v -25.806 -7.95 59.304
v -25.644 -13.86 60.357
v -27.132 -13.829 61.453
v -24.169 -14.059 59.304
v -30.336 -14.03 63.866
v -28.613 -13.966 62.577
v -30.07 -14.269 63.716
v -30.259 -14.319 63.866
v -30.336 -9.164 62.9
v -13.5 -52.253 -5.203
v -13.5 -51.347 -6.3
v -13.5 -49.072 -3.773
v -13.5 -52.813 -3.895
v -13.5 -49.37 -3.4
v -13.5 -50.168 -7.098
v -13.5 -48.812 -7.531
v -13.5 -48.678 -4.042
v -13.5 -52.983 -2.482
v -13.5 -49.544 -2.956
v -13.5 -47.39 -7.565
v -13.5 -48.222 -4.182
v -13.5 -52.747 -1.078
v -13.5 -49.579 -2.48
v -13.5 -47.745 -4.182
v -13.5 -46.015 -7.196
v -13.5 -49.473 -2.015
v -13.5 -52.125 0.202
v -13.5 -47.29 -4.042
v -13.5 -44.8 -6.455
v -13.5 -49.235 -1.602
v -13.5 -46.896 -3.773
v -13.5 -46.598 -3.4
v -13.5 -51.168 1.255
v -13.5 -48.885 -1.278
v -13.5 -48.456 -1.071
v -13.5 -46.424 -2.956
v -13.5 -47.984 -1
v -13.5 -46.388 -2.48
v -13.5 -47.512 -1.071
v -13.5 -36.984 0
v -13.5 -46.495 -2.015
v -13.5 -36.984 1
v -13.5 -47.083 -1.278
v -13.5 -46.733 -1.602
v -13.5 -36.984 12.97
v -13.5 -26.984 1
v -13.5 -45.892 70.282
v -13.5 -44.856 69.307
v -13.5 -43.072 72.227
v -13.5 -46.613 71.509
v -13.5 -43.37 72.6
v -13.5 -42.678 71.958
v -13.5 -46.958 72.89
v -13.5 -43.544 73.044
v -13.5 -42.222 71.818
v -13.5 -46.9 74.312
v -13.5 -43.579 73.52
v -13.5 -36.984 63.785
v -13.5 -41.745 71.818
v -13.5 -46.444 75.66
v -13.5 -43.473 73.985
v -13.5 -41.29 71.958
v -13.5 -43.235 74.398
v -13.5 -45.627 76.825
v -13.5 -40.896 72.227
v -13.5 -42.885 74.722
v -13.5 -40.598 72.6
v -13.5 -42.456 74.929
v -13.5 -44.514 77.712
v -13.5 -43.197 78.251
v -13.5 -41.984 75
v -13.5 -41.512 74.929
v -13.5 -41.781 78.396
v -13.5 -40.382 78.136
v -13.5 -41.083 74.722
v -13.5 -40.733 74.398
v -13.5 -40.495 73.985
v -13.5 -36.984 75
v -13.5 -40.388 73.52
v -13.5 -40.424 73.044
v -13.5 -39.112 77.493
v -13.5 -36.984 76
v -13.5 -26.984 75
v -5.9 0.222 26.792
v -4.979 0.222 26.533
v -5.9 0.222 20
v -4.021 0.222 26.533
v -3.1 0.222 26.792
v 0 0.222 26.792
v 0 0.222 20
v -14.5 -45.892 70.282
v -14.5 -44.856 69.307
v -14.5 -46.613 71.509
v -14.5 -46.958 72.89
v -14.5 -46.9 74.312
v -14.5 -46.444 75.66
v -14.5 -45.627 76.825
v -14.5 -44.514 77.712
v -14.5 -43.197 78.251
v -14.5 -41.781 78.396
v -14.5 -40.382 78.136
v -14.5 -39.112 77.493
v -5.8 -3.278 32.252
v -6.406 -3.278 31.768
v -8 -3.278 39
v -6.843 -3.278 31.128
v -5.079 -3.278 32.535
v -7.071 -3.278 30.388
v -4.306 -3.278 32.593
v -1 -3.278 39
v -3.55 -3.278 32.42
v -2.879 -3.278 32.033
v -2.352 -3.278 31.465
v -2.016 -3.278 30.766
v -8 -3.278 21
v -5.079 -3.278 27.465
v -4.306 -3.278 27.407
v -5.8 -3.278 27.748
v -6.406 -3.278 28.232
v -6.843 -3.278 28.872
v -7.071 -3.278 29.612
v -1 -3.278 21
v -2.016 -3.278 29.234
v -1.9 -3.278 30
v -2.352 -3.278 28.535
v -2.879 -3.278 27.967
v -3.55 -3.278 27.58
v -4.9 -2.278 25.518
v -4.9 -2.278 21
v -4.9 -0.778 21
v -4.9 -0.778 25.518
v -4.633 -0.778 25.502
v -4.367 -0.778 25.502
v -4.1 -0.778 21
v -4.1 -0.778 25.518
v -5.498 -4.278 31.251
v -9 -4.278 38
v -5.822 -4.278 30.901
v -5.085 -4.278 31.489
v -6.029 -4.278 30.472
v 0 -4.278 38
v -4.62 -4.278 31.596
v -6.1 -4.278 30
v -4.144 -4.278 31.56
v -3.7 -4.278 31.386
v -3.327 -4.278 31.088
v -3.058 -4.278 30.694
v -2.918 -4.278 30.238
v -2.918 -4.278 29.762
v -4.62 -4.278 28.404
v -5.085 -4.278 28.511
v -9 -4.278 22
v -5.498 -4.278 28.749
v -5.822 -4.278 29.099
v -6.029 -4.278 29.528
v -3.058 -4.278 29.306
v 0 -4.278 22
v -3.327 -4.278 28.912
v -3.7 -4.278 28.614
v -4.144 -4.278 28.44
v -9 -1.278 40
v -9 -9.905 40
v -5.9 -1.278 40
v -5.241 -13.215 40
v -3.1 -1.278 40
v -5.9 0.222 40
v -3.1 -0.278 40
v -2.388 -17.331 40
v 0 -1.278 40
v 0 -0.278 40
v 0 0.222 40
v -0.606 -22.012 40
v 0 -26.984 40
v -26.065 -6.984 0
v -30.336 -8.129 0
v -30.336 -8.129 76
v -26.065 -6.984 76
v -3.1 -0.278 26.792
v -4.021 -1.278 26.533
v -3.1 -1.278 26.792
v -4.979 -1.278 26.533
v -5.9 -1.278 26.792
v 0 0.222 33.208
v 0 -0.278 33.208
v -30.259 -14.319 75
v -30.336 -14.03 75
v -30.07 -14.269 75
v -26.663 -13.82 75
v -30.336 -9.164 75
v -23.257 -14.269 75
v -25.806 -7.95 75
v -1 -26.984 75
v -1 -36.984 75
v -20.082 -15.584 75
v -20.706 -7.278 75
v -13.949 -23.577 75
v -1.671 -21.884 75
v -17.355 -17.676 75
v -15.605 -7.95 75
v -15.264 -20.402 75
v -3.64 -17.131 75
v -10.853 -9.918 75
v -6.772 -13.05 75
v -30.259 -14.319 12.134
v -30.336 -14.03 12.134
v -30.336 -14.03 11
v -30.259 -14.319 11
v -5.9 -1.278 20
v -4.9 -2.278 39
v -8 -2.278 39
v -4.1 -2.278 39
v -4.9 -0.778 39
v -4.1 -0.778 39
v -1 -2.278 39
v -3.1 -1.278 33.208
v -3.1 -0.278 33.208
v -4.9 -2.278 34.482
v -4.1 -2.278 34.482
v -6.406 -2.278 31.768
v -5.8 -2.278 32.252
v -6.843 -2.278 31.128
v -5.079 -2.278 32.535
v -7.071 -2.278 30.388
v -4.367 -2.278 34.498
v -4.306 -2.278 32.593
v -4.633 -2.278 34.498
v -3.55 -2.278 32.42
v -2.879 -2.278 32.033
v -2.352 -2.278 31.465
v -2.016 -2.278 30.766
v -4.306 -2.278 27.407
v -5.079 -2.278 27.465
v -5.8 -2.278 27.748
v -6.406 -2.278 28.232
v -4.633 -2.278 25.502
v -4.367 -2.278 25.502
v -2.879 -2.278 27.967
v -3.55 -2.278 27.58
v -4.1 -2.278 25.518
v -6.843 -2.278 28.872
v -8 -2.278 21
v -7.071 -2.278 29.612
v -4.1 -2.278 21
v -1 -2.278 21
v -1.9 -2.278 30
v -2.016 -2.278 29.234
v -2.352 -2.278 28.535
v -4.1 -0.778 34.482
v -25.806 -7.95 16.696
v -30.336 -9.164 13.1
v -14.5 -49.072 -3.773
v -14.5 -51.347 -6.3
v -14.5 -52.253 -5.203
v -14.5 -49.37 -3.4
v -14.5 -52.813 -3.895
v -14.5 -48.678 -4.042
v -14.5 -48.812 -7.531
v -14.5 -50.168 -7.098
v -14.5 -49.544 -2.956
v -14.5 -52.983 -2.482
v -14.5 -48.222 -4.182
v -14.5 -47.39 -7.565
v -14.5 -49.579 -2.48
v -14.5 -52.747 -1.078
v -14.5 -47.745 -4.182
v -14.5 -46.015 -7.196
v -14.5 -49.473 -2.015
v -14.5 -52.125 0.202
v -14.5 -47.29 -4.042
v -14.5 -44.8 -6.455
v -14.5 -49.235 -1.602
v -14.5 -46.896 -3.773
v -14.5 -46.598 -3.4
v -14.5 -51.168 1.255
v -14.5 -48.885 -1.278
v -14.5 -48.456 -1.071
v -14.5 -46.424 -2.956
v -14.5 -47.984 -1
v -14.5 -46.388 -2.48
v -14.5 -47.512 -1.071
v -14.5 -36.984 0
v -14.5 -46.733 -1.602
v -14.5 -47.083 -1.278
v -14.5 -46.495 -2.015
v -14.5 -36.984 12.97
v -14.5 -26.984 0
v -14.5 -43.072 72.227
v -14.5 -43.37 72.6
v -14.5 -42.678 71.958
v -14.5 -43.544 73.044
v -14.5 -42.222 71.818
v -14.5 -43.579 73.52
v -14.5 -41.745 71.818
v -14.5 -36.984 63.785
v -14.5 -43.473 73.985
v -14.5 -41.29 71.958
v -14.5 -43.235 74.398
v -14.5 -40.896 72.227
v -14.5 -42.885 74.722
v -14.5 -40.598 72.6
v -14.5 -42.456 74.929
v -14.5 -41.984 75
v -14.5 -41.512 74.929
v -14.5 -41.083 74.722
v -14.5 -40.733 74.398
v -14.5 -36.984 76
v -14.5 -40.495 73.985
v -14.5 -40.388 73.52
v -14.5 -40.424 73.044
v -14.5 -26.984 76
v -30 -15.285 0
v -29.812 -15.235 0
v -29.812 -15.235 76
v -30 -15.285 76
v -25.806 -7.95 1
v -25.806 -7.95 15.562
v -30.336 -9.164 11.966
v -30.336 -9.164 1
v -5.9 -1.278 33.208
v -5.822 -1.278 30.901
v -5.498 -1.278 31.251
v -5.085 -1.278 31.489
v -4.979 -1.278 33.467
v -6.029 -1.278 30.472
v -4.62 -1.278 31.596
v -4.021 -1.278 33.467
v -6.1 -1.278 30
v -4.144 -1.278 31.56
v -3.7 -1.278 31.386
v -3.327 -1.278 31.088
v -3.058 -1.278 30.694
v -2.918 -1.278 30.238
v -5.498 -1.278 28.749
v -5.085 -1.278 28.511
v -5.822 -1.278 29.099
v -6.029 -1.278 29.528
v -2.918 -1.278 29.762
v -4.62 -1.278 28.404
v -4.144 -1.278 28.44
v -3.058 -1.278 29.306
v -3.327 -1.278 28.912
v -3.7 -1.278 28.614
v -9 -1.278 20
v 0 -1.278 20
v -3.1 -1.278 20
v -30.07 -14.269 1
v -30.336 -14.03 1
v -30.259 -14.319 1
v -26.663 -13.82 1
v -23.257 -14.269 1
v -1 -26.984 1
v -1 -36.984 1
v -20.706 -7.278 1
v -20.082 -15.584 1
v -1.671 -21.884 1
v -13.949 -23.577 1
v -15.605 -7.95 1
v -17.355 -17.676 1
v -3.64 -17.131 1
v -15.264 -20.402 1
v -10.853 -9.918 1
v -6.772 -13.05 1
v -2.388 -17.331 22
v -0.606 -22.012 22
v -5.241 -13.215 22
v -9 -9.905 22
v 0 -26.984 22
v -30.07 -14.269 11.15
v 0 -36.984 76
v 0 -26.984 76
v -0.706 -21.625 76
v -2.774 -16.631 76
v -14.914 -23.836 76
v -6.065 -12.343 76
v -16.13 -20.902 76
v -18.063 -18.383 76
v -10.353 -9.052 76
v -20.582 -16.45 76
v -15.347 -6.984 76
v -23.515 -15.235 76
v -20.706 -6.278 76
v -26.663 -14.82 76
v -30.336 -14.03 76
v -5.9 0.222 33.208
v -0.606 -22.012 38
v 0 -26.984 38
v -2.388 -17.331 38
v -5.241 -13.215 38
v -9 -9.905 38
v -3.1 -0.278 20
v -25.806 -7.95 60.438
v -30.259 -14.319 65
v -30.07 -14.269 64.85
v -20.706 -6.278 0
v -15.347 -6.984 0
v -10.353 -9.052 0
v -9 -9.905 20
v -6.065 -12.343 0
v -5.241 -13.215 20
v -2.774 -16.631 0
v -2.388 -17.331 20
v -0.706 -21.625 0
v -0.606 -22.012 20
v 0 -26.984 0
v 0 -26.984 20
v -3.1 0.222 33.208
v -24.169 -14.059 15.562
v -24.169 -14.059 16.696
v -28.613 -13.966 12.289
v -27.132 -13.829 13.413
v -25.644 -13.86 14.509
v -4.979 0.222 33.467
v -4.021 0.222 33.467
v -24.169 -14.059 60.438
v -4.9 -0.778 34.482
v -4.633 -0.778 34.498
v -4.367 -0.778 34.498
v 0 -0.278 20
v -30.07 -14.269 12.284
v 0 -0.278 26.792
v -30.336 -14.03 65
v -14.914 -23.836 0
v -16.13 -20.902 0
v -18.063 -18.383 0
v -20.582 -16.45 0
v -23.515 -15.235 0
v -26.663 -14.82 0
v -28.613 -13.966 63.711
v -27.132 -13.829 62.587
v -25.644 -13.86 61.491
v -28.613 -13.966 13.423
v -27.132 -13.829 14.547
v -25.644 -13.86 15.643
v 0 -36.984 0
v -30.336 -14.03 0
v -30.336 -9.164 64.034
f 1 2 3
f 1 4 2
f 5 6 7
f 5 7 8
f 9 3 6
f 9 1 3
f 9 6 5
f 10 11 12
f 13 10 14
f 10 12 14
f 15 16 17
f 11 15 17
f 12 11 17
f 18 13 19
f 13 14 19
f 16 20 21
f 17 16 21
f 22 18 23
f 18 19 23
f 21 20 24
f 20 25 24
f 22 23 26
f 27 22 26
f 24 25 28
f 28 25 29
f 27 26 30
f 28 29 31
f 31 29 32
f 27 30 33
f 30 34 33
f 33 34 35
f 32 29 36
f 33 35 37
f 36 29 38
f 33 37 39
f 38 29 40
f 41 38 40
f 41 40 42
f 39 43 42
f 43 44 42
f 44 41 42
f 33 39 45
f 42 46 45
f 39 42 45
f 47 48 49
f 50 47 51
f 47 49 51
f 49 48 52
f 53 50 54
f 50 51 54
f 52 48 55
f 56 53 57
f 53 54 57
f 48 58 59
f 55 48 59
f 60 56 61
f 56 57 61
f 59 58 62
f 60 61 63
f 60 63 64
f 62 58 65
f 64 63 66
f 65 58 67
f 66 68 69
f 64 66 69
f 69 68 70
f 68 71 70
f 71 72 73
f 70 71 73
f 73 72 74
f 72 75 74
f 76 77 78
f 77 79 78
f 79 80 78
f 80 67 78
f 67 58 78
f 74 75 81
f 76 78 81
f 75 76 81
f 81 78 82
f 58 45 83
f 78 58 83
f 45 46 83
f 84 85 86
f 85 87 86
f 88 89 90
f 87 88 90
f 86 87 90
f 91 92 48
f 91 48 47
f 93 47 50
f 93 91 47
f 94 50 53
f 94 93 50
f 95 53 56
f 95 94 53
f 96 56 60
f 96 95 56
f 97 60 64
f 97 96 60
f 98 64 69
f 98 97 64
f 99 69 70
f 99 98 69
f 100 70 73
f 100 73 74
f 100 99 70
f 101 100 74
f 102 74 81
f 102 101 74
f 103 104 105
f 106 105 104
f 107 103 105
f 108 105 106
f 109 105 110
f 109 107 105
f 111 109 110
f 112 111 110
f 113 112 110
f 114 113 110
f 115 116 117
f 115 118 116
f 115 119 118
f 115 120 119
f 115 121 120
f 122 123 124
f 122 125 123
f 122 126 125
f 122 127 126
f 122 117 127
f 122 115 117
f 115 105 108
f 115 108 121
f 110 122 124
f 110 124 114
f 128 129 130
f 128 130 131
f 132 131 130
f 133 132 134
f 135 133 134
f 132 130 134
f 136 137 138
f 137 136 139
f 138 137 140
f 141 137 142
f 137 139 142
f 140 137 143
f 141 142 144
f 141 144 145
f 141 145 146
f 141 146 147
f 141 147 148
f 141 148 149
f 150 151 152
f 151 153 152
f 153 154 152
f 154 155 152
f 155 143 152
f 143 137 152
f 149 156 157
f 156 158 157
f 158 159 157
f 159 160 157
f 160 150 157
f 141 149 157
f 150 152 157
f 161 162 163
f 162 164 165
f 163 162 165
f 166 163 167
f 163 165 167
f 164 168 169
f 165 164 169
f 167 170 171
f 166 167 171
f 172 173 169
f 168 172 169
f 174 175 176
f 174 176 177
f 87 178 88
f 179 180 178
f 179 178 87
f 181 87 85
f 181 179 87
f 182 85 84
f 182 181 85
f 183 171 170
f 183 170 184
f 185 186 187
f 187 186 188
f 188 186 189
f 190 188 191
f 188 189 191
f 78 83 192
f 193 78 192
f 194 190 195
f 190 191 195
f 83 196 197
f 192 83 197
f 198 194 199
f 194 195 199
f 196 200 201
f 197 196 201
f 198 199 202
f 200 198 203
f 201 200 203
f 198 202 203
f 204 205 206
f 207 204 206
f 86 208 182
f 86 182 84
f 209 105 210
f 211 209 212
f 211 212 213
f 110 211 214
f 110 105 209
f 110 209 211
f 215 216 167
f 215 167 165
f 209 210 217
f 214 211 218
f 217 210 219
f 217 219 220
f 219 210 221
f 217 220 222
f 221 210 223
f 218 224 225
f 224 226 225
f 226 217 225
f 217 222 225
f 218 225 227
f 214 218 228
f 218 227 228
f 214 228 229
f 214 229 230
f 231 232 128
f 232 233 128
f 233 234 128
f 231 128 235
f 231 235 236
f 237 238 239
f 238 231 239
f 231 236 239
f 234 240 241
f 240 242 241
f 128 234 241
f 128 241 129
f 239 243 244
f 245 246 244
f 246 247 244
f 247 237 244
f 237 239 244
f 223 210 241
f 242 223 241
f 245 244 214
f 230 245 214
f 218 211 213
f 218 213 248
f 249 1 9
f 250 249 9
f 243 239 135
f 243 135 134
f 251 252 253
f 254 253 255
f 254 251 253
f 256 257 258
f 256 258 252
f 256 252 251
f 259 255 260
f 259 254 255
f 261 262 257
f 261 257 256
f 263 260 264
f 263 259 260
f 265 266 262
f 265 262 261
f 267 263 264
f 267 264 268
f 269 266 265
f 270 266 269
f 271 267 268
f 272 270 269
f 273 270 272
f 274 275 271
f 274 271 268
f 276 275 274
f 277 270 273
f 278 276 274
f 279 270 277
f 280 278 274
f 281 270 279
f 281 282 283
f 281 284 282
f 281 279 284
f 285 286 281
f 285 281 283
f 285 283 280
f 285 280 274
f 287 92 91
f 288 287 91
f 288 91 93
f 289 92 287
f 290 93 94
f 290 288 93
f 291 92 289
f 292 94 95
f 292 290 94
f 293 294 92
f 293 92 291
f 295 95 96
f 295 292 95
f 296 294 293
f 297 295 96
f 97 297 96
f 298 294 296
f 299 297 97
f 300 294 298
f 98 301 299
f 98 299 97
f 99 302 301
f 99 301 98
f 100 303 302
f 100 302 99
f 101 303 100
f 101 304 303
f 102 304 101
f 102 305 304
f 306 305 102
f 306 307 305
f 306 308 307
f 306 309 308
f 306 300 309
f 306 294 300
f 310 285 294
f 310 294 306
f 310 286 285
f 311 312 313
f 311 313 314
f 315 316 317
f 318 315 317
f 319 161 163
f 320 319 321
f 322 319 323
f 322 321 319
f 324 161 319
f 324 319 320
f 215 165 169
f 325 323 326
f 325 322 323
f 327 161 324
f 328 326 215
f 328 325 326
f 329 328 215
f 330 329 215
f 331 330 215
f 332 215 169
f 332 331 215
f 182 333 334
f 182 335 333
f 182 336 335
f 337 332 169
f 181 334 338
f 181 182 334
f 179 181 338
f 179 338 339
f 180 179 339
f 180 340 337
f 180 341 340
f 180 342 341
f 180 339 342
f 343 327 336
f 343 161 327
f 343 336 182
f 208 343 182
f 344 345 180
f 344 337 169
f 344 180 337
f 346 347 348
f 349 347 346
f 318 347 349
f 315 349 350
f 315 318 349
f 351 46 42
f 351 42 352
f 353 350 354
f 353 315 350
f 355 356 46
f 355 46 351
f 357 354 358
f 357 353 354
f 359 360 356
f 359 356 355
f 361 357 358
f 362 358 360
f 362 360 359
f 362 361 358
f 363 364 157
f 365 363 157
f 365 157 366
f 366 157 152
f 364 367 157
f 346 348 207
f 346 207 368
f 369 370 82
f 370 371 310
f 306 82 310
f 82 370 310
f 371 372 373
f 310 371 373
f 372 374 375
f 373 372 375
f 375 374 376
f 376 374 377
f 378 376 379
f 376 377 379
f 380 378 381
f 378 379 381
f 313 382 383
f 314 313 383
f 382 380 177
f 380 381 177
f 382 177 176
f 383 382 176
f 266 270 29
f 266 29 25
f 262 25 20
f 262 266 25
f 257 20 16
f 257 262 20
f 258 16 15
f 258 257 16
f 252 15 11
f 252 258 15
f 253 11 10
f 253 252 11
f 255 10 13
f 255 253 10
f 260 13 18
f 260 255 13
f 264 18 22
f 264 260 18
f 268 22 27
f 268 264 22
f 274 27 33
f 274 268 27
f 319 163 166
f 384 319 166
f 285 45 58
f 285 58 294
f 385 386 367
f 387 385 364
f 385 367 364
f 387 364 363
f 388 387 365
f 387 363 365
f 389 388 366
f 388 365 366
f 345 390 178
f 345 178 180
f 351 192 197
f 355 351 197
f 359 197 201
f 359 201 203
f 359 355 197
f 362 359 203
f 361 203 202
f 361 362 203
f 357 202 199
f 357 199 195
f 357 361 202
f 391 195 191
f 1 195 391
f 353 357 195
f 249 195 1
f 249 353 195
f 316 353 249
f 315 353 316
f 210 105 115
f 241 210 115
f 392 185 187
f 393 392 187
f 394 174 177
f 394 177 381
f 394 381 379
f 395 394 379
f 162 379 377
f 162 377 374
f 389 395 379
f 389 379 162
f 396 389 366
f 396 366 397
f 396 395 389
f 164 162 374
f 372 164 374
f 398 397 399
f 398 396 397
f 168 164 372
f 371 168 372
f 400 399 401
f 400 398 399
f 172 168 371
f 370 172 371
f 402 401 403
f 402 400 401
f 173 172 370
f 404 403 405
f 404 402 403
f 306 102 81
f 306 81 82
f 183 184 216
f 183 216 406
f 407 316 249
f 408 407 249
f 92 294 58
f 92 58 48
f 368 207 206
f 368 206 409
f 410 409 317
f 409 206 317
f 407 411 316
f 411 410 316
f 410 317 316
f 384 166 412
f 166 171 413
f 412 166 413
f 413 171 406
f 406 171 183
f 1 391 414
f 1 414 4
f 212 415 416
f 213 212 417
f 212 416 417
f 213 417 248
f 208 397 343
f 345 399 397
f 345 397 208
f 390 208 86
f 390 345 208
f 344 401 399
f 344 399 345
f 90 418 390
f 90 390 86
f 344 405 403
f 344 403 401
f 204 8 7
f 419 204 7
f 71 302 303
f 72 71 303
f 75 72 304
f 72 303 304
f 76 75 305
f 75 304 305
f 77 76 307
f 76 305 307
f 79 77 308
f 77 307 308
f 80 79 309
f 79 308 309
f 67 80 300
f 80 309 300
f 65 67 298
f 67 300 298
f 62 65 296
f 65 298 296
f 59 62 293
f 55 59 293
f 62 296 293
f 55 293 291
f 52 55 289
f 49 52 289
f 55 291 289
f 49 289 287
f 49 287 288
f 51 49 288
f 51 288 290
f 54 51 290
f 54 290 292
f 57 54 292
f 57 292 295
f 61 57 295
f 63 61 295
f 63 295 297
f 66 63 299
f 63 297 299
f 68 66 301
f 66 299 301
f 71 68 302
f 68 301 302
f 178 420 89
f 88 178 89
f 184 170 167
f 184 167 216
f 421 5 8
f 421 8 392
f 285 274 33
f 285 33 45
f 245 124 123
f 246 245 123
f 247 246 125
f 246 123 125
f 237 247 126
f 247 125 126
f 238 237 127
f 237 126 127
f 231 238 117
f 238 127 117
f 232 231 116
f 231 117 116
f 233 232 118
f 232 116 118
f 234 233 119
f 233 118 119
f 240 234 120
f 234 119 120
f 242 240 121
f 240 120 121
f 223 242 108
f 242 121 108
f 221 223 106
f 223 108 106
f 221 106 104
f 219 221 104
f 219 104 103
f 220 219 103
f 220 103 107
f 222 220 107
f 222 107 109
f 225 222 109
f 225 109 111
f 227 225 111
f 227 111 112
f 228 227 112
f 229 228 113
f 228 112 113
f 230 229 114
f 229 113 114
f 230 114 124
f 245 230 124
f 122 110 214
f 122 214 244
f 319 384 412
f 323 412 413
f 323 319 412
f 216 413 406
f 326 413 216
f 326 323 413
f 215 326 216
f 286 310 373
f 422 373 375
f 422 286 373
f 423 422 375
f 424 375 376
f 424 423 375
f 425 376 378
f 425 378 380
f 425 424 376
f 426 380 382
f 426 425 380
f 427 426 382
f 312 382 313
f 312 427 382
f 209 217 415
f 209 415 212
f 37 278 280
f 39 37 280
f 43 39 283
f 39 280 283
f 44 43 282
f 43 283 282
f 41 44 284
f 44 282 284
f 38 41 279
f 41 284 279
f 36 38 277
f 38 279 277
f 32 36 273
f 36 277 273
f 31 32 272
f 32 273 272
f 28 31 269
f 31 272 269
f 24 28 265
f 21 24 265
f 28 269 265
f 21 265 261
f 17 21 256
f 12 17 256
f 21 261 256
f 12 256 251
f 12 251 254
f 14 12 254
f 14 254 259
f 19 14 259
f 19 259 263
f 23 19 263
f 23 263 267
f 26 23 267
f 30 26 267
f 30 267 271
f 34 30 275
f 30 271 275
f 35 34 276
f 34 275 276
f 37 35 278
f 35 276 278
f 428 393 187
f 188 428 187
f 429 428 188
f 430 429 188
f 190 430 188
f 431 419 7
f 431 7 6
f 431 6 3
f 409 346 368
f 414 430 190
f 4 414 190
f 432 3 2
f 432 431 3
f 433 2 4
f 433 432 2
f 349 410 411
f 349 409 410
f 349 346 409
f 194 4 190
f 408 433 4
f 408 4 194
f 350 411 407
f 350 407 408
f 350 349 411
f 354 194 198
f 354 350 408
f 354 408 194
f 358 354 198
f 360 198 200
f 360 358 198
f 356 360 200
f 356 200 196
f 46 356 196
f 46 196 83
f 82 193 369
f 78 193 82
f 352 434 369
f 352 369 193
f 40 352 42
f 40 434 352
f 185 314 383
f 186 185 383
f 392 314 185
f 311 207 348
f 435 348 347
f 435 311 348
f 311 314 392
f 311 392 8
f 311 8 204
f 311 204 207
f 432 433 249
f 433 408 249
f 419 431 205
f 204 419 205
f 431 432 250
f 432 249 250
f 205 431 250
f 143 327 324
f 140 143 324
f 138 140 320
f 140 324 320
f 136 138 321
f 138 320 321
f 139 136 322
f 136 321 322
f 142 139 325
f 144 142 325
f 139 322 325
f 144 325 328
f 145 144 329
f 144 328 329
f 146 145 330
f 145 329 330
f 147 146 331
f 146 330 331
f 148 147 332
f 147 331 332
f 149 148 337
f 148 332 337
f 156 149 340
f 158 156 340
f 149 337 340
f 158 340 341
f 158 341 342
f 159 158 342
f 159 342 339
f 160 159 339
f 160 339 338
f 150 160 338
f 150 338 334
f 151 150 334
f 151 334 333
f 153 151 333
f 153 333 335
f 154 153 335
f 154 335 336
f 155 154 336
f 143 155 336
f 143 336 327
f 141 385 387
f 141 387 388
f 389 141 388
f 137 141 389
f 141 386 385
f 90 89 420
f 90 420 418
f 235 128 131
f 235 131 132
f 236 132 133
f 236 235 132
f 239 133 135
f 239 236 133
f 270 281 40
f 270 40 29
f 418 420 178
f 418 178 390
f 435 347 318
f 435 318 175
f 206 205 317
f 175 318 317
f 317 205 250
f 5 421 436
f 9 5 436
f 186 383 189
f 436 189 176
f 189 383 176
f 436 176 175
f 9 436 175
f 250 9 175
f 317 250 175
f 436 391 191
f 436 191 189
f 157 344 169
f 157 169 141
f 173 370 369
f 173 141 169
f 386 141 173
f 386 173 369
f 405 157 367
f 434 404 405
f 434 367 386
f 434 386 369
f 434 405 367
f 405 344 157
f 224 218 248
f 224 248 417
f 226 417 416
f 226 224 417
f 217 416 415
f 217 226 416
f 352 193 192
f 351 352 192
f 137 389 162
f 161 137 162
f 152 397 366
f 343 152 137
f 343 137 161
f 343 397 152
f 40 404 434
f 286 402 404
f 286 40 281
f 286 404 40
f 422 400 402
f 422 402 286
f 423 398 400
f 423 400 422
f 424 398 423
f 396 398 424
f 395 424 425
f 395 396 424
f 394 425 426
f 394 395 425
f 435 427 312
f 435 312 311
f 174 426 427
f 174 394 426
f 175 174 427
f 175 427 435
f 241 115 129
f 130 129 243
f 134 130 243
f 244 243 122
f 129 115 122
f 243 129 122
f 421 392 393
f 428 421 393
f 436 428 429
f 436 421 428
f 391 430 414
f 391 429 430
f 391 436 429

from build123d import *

# Parameters (mm, degrees)
RESSALTO_EXTRUS_O1_DEPTH          = 76
CORTE_EXTRUS_O2_DEPTH             = 91.309467661
RESSALTO_EXTRUS_O4_START          = -20
RESSALTO_EXTRUS_O4_DEPTH          = 20
CORTE_EXTRUS_O6_START             = -22
CORTE_EXTRUS_O6_DEPTH             = 16
ESBO_O12_R                        = 3.5
ESBO_O12_R_2                      = 1.6
CORTE_EXTRUS_O7_DEPTH             = 2
ESBO_O12_2_R                      = 1.6
CORTE_EXTRUS_O8_DEPTH             = 90.2814959
CORTE_EXTRUS_O8_DIRECTION_2_REACH = 91.281
RESSALTO_EXTRUS_O5_REACH          = 91.8
ESBO_O14_W                        = 6.792197014
ESBO_O14_H                        = 0.5
CASCA1_START                      = 1
CASCA1_DEPTH                      = 74
CASCA1_START_2                    = -3.278440116
CASCA1_2_OUTLINE_W                = 7
CASCA1_2_OUTLINE_H                = 18
CASCA1_2_OUTLINE_R                = 2.6
CASCA1_2_DEPTH                    = 1
CASCA1_START_3                    = -2.278440116
CASCA1_3_DEPTH                    = 1.5
RESSALTO_EXTRUS_O6_REACH          = 91.8
CORTE_EXTRUS_O9_DEPTH             = 91.309467661
CORTE_EXTRUS_O9_DEPTH_BACK        = 91.309467661
ESBO_O17_R                        = 1.6
RESSALTO_EXTRUS_O7_DEPTH          = 1


# Read off the part's stored shape, not the designer's step: Casca1
with BuildPart() as part:
    # Esboço1 → Ressalto-extrusão1 (new body)
    with BuildSketch(Plane.XY):
        with BuildLine():
            Line((-31.811733316, -8.523928252), (-26.064507457, -6.983963724))
            ThreePointArc((-26.064507457, -6.983963724), (-8.100799468, -10.557167407), (0, -26.983963724))
            Line((0, -26.983963724), (0, -36.983963724))
            Line((0, -36.983963724), (-14.5, -36.983963724))
            Line((-14.5, -36.983963724), (-14.5, -26.983963724))
            ThreePointArc((-14.5, -26.983963724), (-19.25882596, -17.334019289), (-29.811631303, -15.234935796))
            Line((-29.811631303, -15.234935796), (-30, -15.285409036))
            Line((-30, -15.285409036), (-31.811733316, -8.523928252))
        make_face()
    extrude(amount=RESSALTO_EXTRUS_O1_DEPTH)

    # Esboço3 → Corte-extrusão2 (cut, through all)
    with BuildSketch(Plane.XY.offset(76)):
        Polygon((-30.336464759, -14.029705462), (-30.336464759, -8.128631233), (-31.811733316, -8.523928252), align=None)
    extrude(amount=-CORTE_EXTRUS_O2_DEPTH, mode=Mode.SUBTRACT)

    # Esboço8 → Ressalto-extrusão4 (add)
    with BuildSketch(Plane(origin=(0, 0, 0), x_dir=(-1, 0, 0), z_dir=(0, 0, -1)).offset(RESSALTO_EXTRUS_O4_START)):
        with BuildLine():
            Line((9, -1.278440116), (5.9, -1.278440116))
            Line((5.9, -1.278440116), (5.9, 0.221559884))
            Line((5.9, 0.221559884), (3.1, 0.221559884))
            Line((3.1, 0.221559884), (3.1, -1.278440116))
            Line((3.1, -1.278440116), (0, -1.278440116))
            Line((0, -1.278440116), (0, -26.983963724))
            ThreePointArc((0, -26.983963724), (2.38766752, -17.331251347), (9, -9.90475341))
            Line((9, -9.90475341), (9, -1.278440116))
        make_face()
    extrude(amount=-RESSALTO_EXTRUS_O4_DEPTH)

    # Esboço8<3> → Corte-extrusão6 (cut)
    with BuildSketch(Plane(origin=(0, 0, 0), x_dir=(-1, 0, 0), z_dir=(0, 0, -1)).offset(CORTE_EXTRUS_O6_START)):
        with BuildLine():
            Line((9, -9.90475341), (9, -4.278440116))
            Line((9, -4.278440116), (0, -4.278440116))
            Line((0, -4.278440116), (0, -26.983963724))
            ThreePointArc((0, -26.983963724), (2.38766752, -17.331251347), (9, -9.90475341))
        make_face()
    extrude(amount=-CORTE_EXTRUS_O6_DEPTH, mode=Mode.SUBTRACT)

    # Esboço12 → Corte-extrusão7 (cut)
    with BuildSketch(Plane(origin=(0, -1.278440116, 0), x_dir=(1, 0, 0), z_dir=(0, 1, 0))):
        with Locations((-4.5, -30)):
            Circle(ESBO_O12_R)
        with Locations((-4.5, -30)):
            Circle(ESBO_O12_R_2, mode=Mode.SUBTRACT)
    extrude(amount=CORTE_EXTRUS_O7_DEPTH, mode=Mode.SUBTRACT)

    # Esboço12<2> → Corte-extrusão8 (cut)
    with BuildSketch(Plane(origin=(0, -1.278440116, 0), x_dir=(1, 0, 0), z_dir=(0, 1, 0))):
        with Locations(Location((-4.5, -30, 0), (0, 0, 180))):
            Circle(ESBO_O12_2_R)
    extrude(amount=CORTE_EXTRUS_O8_DEPTH, mode=Mode.SUBTRACT)

    # Esboço12<2> → Corte-extrusão8 direction 2 (cut, up to next)
    with BuildSketch(Plane(origin=(0, -1.278440116, 0), x_dir=(1, 0, 0), z_dir=(0, 1, 0)), mode=Mode.PRIVATE) as corte_extrus_o8_direction_2_sk1:
        with Locations(Location((-4.5, -30, 0), (0, 0, 180))):
            Circle(ESBO_O12_2_R)
    corte_extrus_o8_direction_2_tool1 = extrude(corte_extrus_o8_direction_2_sk1.sketch, amount=-CORTE_EXTRUS_O8_DIRECTION_2_REACH, mode=Mode.PRIVATE) & part.part
    add(corte_extrus_o8_direction_2_tool1.solids().sort_by_distance((-4.5, -1.27844, 30))[0], mode=Mode.SUBTRACT)

    # Esboço14 → Ressalto-extrusão5 (add, up to next)
    with BuildSketch(Plane(origin=(0, 0, 0), x_dir=(0, 0, -1), z_dir=(1, 0, 0)), mode=Mode.PRIVATE) as ressalto_extrus_o5_sk1:
        with Locations((-36.603901493, -0.028440116)):
            Rectangle(ESBO_O14_W, ESBO_O14_H)
    ressalto_extrus_o5_tool1 = extrude(ressalto_extrus_o5_sk1.sketch, amount=-RESSALTO_EXTRUS_O5_REACH, mode=Mode.PRIVATE) - part.part
    # Esboço14 → Ressalto-extrusão5 (add, up to next)
    with BuildSketch(Plane(origin=(0, 0, 0), x_dir=(0, 0, -1), z_dir=(1, 0, 0)), mode=Mode.PRIVATE) as ressalto_extrus_o5_sk2:
        with Locations((-23.396098507, -0.028440116)):
            Rectangle(ESBO_O14_W, ESBO_O14_H)
    ressalto_extrus_o5_tool2 = extrude(ressalto_extrus_o5_sk2.sketch, amount=-RESSALTO_EXTRUS_O5_REACH, mode=Mode.PRIVATE) - part.part
    add(ressalto_extrus_o5_tool1.solids().sort_by_distance((0, -0.02844, 36.603901))[0])
    add(ressalto_extrus_o5_tool2.solids().sort_by_distance((0, -0.02844, 23.396099))[0])

    # Casca1 outline → Casca1 (cut)
    with BuildSketch(Plane.XY.offset(CASCA1_START)):
        with BuildLine():
            Line((-25.805688412, -7.94988955), (-30.336464759, -9.163907414))
            Line((-30.336464759, -9.163907414), (-30.336464759, -14.029705462))
            Line((-30.336464759, -14.029705462), (-30.258819045, -14.31948321))
            Line((-30.258819045, -14.31948321), (-30.070450348, -14.269009969))
            ThreePointArc((-30.070450348, -14.269009969), (-18.650064531, -16.540665949), (-13.5, -26.983963724))
            Line((-13.5, -26.983963724), (-13.5, -36.983963724))
            Line((-13.5, -36.983963724), (-1, -36.983963724))
            Line((-1, -36.983963724), (-1, -26.983963724))
            ThreePointArc((-1, -26.983963724), (-8.709560897, -11.350520747), (-25.805688412, -7.94988955))
        make_face()
    extrude(amount=CASCA1_DEPTH, mode=Mode.SUBTRACT)

    # Casca1 2 outline → Casca1 2 (cut)
    with BuildSketch(Plane(origin=(0, 0, 0), x_dir=(1, 0, 0), z_dir=(0, 1, 0)).offset(CASCA1_START_2)):
        with Locations((-4.5, -30)):
            Rectangle(CASCA1_2_OUTLINE_W, CASCA1_2_OUTLINE_H)
        with Locations((-4.5, -30)):
            Circle(CASCA1_2_OUTLINE_R, mode=Mode.SUBTRACT)
    extrude(amount=CASCA1_2_DEPTH, mode=Mode.SUBTRACT)

    # Casca1 3 outline → Casca1 3 (cut)
    with BuildSketch(Plane(origin=(0, 0, 0), x_dir=(1, 0, 0), z_dir=(0, 1, 0)).offset(CASCA1_START_3)):
        with BuildLine():
            Line((-4.1, -25.517813034), (-4.1, -21))
            Line((-4.1, -21), (-4.9, -21))
            Line((-4.9, -21), (-4.9, -25.517813034))
            ThreePointArc((-4.9, -25.517813034), (-4.5, -25.5), (-4.1, -25.517813034))
        make_face()
        with BuildLine():
            Line((-4.9, -39), (-4.1, -39))
            Line((-4.1, -39), (-4.1, -34.482186966))
            ThreePointArc((-4.1, -34.482186966), (-4.5, -34.5), (-4.9, -34.482186966))
            Line((-4.9, -34.482186966), (-4.9, -39))
        make_face()
    extrude(amount=CASCA1_3_DEPTH, mode=Mode.SUBTRACT)

    # Esboço15 → Ressalto-extrusão6 (add, up to next)
    with BuildSketch(Plane(origin=(0, 0, 0), x_dir=(0.965925826289069, 0.2588190451025183, 0), z_dir=(-0.2588190451025183, 0.965925826289069, 0)), mode=Mode.PRIVATE) as ressalto_extrus_o6_sk1:
        Polygon((-32.933929759, -11), (-26.983963724, -15.561640627), (-26.983963724, -16.695704117), (-32.933929759, -12.13406349), align=None)
    ressalto_extrus_o6_tool1 = extrude(ressalto_extrus_o6_sk1.sketch, amount=-RESSALTO_EXTRUS_O6_REACH, mode=Mode.PRIVATE) - part.part
    # Esboço15 → Ressalto-extrusão6 (add, up to next)
    with BuildSketch(Plane(origin=(0, 0, 0), x_dir=(0.965925826289069, 0.2588190451025183, 0), z_dir=(-0.2588190451025183, 0.965925826289069, 0)), mode=Mode.PRIVATE) as ressalto_extrus_o6_sk2:
        Polygon((-32.933929759, -63.86593651), (-32.933929759, -65), (-26.983963724, -60.438359373), (-26.983963724, -59.304295883), align=None)
    ressalto_extrus_o6_tool2 = extrude(ressalto_extrus_o6_sk2.sketch, amount=-RESSALTO_EXTRUS_O6_REACH, mode=Mode.PRIVATE) - part.part
    add(ressalto_extrus_o6_tool1.solids().sort_by_distance((-28.93812, -7.753946, 13.847852))[0])
    add(ressalto_extrus_o6_tool2.solids().sort_by_distance((-28.93812, -7.753946, 62.152148))[0])

    # Esboço16 → Corte-extrusão9 (cut, two sides: drawn at the far end of the back side and taken through both)
    with BuildSketch(Plane.XY.offset(76).offset(-CORTE_EXTRUS_O9_DEPTH_BACK)):
        Polygon((-31.811733316, -8.523928252), (-30.336464759, -14.029705462), (-30.336464759, -8.128631233), align=None)
    extrude(amount=CORTE_EXTRUS_O9_DEPTH + CORTE_EXTRUS_O9_DEPTH_BACK, mode=Mode.SUBTRACT)

    # Esboço17 → Ressalto-extrusão7 (add)
    # profile 1 of 2: a face of its own
    with BuildSketch(Plane.ZY.offset(14.5)):
        with BuildLine():
            Line((0, -36.983963724), (-6.455184248, -44.800011084))
            ThreePointArc((-6.455184248, -44.800011084), (-5.78395264, -51.839147972), (1.255184248, -51.167916365))
            Line((1.255184248, -51.167916365), (12.969548739, -36.983963724))
            Line((12.969548739, -36.983963724), (0, -36.983963724))
        make_face()
        with Locations((-2.6, -47.983963724)):
            Circle(ESBO_O17_R, mode=Mode.SUBTRACT)
    # profile 2 of 2: a face of its own
    with BuildSketch(Plane.ZY.offset(14.5)):
        with BuildLine():
            Line((77.493198992, -39.1124272), (76, -36.983963724))
            Line((76, -36.983963724), (63.784615385, -36.983963724))
            Line((63.784615385, -36.983963724), (69.306801008, -44.855500248))
            ThreePointArc((69.306801008, -44.855500248), (76.271536524, -46.077162717), (77.493198992, -39.1124272))
        make_face()
        with Locations((73.4, -41.983963724)):
            Circle(ESBO_O17_R, mode=Mode.SUBTRACT)
    extrude(amount=-RESSALTO_EXTRUS_O7_DEPTH)


solid = part.part
